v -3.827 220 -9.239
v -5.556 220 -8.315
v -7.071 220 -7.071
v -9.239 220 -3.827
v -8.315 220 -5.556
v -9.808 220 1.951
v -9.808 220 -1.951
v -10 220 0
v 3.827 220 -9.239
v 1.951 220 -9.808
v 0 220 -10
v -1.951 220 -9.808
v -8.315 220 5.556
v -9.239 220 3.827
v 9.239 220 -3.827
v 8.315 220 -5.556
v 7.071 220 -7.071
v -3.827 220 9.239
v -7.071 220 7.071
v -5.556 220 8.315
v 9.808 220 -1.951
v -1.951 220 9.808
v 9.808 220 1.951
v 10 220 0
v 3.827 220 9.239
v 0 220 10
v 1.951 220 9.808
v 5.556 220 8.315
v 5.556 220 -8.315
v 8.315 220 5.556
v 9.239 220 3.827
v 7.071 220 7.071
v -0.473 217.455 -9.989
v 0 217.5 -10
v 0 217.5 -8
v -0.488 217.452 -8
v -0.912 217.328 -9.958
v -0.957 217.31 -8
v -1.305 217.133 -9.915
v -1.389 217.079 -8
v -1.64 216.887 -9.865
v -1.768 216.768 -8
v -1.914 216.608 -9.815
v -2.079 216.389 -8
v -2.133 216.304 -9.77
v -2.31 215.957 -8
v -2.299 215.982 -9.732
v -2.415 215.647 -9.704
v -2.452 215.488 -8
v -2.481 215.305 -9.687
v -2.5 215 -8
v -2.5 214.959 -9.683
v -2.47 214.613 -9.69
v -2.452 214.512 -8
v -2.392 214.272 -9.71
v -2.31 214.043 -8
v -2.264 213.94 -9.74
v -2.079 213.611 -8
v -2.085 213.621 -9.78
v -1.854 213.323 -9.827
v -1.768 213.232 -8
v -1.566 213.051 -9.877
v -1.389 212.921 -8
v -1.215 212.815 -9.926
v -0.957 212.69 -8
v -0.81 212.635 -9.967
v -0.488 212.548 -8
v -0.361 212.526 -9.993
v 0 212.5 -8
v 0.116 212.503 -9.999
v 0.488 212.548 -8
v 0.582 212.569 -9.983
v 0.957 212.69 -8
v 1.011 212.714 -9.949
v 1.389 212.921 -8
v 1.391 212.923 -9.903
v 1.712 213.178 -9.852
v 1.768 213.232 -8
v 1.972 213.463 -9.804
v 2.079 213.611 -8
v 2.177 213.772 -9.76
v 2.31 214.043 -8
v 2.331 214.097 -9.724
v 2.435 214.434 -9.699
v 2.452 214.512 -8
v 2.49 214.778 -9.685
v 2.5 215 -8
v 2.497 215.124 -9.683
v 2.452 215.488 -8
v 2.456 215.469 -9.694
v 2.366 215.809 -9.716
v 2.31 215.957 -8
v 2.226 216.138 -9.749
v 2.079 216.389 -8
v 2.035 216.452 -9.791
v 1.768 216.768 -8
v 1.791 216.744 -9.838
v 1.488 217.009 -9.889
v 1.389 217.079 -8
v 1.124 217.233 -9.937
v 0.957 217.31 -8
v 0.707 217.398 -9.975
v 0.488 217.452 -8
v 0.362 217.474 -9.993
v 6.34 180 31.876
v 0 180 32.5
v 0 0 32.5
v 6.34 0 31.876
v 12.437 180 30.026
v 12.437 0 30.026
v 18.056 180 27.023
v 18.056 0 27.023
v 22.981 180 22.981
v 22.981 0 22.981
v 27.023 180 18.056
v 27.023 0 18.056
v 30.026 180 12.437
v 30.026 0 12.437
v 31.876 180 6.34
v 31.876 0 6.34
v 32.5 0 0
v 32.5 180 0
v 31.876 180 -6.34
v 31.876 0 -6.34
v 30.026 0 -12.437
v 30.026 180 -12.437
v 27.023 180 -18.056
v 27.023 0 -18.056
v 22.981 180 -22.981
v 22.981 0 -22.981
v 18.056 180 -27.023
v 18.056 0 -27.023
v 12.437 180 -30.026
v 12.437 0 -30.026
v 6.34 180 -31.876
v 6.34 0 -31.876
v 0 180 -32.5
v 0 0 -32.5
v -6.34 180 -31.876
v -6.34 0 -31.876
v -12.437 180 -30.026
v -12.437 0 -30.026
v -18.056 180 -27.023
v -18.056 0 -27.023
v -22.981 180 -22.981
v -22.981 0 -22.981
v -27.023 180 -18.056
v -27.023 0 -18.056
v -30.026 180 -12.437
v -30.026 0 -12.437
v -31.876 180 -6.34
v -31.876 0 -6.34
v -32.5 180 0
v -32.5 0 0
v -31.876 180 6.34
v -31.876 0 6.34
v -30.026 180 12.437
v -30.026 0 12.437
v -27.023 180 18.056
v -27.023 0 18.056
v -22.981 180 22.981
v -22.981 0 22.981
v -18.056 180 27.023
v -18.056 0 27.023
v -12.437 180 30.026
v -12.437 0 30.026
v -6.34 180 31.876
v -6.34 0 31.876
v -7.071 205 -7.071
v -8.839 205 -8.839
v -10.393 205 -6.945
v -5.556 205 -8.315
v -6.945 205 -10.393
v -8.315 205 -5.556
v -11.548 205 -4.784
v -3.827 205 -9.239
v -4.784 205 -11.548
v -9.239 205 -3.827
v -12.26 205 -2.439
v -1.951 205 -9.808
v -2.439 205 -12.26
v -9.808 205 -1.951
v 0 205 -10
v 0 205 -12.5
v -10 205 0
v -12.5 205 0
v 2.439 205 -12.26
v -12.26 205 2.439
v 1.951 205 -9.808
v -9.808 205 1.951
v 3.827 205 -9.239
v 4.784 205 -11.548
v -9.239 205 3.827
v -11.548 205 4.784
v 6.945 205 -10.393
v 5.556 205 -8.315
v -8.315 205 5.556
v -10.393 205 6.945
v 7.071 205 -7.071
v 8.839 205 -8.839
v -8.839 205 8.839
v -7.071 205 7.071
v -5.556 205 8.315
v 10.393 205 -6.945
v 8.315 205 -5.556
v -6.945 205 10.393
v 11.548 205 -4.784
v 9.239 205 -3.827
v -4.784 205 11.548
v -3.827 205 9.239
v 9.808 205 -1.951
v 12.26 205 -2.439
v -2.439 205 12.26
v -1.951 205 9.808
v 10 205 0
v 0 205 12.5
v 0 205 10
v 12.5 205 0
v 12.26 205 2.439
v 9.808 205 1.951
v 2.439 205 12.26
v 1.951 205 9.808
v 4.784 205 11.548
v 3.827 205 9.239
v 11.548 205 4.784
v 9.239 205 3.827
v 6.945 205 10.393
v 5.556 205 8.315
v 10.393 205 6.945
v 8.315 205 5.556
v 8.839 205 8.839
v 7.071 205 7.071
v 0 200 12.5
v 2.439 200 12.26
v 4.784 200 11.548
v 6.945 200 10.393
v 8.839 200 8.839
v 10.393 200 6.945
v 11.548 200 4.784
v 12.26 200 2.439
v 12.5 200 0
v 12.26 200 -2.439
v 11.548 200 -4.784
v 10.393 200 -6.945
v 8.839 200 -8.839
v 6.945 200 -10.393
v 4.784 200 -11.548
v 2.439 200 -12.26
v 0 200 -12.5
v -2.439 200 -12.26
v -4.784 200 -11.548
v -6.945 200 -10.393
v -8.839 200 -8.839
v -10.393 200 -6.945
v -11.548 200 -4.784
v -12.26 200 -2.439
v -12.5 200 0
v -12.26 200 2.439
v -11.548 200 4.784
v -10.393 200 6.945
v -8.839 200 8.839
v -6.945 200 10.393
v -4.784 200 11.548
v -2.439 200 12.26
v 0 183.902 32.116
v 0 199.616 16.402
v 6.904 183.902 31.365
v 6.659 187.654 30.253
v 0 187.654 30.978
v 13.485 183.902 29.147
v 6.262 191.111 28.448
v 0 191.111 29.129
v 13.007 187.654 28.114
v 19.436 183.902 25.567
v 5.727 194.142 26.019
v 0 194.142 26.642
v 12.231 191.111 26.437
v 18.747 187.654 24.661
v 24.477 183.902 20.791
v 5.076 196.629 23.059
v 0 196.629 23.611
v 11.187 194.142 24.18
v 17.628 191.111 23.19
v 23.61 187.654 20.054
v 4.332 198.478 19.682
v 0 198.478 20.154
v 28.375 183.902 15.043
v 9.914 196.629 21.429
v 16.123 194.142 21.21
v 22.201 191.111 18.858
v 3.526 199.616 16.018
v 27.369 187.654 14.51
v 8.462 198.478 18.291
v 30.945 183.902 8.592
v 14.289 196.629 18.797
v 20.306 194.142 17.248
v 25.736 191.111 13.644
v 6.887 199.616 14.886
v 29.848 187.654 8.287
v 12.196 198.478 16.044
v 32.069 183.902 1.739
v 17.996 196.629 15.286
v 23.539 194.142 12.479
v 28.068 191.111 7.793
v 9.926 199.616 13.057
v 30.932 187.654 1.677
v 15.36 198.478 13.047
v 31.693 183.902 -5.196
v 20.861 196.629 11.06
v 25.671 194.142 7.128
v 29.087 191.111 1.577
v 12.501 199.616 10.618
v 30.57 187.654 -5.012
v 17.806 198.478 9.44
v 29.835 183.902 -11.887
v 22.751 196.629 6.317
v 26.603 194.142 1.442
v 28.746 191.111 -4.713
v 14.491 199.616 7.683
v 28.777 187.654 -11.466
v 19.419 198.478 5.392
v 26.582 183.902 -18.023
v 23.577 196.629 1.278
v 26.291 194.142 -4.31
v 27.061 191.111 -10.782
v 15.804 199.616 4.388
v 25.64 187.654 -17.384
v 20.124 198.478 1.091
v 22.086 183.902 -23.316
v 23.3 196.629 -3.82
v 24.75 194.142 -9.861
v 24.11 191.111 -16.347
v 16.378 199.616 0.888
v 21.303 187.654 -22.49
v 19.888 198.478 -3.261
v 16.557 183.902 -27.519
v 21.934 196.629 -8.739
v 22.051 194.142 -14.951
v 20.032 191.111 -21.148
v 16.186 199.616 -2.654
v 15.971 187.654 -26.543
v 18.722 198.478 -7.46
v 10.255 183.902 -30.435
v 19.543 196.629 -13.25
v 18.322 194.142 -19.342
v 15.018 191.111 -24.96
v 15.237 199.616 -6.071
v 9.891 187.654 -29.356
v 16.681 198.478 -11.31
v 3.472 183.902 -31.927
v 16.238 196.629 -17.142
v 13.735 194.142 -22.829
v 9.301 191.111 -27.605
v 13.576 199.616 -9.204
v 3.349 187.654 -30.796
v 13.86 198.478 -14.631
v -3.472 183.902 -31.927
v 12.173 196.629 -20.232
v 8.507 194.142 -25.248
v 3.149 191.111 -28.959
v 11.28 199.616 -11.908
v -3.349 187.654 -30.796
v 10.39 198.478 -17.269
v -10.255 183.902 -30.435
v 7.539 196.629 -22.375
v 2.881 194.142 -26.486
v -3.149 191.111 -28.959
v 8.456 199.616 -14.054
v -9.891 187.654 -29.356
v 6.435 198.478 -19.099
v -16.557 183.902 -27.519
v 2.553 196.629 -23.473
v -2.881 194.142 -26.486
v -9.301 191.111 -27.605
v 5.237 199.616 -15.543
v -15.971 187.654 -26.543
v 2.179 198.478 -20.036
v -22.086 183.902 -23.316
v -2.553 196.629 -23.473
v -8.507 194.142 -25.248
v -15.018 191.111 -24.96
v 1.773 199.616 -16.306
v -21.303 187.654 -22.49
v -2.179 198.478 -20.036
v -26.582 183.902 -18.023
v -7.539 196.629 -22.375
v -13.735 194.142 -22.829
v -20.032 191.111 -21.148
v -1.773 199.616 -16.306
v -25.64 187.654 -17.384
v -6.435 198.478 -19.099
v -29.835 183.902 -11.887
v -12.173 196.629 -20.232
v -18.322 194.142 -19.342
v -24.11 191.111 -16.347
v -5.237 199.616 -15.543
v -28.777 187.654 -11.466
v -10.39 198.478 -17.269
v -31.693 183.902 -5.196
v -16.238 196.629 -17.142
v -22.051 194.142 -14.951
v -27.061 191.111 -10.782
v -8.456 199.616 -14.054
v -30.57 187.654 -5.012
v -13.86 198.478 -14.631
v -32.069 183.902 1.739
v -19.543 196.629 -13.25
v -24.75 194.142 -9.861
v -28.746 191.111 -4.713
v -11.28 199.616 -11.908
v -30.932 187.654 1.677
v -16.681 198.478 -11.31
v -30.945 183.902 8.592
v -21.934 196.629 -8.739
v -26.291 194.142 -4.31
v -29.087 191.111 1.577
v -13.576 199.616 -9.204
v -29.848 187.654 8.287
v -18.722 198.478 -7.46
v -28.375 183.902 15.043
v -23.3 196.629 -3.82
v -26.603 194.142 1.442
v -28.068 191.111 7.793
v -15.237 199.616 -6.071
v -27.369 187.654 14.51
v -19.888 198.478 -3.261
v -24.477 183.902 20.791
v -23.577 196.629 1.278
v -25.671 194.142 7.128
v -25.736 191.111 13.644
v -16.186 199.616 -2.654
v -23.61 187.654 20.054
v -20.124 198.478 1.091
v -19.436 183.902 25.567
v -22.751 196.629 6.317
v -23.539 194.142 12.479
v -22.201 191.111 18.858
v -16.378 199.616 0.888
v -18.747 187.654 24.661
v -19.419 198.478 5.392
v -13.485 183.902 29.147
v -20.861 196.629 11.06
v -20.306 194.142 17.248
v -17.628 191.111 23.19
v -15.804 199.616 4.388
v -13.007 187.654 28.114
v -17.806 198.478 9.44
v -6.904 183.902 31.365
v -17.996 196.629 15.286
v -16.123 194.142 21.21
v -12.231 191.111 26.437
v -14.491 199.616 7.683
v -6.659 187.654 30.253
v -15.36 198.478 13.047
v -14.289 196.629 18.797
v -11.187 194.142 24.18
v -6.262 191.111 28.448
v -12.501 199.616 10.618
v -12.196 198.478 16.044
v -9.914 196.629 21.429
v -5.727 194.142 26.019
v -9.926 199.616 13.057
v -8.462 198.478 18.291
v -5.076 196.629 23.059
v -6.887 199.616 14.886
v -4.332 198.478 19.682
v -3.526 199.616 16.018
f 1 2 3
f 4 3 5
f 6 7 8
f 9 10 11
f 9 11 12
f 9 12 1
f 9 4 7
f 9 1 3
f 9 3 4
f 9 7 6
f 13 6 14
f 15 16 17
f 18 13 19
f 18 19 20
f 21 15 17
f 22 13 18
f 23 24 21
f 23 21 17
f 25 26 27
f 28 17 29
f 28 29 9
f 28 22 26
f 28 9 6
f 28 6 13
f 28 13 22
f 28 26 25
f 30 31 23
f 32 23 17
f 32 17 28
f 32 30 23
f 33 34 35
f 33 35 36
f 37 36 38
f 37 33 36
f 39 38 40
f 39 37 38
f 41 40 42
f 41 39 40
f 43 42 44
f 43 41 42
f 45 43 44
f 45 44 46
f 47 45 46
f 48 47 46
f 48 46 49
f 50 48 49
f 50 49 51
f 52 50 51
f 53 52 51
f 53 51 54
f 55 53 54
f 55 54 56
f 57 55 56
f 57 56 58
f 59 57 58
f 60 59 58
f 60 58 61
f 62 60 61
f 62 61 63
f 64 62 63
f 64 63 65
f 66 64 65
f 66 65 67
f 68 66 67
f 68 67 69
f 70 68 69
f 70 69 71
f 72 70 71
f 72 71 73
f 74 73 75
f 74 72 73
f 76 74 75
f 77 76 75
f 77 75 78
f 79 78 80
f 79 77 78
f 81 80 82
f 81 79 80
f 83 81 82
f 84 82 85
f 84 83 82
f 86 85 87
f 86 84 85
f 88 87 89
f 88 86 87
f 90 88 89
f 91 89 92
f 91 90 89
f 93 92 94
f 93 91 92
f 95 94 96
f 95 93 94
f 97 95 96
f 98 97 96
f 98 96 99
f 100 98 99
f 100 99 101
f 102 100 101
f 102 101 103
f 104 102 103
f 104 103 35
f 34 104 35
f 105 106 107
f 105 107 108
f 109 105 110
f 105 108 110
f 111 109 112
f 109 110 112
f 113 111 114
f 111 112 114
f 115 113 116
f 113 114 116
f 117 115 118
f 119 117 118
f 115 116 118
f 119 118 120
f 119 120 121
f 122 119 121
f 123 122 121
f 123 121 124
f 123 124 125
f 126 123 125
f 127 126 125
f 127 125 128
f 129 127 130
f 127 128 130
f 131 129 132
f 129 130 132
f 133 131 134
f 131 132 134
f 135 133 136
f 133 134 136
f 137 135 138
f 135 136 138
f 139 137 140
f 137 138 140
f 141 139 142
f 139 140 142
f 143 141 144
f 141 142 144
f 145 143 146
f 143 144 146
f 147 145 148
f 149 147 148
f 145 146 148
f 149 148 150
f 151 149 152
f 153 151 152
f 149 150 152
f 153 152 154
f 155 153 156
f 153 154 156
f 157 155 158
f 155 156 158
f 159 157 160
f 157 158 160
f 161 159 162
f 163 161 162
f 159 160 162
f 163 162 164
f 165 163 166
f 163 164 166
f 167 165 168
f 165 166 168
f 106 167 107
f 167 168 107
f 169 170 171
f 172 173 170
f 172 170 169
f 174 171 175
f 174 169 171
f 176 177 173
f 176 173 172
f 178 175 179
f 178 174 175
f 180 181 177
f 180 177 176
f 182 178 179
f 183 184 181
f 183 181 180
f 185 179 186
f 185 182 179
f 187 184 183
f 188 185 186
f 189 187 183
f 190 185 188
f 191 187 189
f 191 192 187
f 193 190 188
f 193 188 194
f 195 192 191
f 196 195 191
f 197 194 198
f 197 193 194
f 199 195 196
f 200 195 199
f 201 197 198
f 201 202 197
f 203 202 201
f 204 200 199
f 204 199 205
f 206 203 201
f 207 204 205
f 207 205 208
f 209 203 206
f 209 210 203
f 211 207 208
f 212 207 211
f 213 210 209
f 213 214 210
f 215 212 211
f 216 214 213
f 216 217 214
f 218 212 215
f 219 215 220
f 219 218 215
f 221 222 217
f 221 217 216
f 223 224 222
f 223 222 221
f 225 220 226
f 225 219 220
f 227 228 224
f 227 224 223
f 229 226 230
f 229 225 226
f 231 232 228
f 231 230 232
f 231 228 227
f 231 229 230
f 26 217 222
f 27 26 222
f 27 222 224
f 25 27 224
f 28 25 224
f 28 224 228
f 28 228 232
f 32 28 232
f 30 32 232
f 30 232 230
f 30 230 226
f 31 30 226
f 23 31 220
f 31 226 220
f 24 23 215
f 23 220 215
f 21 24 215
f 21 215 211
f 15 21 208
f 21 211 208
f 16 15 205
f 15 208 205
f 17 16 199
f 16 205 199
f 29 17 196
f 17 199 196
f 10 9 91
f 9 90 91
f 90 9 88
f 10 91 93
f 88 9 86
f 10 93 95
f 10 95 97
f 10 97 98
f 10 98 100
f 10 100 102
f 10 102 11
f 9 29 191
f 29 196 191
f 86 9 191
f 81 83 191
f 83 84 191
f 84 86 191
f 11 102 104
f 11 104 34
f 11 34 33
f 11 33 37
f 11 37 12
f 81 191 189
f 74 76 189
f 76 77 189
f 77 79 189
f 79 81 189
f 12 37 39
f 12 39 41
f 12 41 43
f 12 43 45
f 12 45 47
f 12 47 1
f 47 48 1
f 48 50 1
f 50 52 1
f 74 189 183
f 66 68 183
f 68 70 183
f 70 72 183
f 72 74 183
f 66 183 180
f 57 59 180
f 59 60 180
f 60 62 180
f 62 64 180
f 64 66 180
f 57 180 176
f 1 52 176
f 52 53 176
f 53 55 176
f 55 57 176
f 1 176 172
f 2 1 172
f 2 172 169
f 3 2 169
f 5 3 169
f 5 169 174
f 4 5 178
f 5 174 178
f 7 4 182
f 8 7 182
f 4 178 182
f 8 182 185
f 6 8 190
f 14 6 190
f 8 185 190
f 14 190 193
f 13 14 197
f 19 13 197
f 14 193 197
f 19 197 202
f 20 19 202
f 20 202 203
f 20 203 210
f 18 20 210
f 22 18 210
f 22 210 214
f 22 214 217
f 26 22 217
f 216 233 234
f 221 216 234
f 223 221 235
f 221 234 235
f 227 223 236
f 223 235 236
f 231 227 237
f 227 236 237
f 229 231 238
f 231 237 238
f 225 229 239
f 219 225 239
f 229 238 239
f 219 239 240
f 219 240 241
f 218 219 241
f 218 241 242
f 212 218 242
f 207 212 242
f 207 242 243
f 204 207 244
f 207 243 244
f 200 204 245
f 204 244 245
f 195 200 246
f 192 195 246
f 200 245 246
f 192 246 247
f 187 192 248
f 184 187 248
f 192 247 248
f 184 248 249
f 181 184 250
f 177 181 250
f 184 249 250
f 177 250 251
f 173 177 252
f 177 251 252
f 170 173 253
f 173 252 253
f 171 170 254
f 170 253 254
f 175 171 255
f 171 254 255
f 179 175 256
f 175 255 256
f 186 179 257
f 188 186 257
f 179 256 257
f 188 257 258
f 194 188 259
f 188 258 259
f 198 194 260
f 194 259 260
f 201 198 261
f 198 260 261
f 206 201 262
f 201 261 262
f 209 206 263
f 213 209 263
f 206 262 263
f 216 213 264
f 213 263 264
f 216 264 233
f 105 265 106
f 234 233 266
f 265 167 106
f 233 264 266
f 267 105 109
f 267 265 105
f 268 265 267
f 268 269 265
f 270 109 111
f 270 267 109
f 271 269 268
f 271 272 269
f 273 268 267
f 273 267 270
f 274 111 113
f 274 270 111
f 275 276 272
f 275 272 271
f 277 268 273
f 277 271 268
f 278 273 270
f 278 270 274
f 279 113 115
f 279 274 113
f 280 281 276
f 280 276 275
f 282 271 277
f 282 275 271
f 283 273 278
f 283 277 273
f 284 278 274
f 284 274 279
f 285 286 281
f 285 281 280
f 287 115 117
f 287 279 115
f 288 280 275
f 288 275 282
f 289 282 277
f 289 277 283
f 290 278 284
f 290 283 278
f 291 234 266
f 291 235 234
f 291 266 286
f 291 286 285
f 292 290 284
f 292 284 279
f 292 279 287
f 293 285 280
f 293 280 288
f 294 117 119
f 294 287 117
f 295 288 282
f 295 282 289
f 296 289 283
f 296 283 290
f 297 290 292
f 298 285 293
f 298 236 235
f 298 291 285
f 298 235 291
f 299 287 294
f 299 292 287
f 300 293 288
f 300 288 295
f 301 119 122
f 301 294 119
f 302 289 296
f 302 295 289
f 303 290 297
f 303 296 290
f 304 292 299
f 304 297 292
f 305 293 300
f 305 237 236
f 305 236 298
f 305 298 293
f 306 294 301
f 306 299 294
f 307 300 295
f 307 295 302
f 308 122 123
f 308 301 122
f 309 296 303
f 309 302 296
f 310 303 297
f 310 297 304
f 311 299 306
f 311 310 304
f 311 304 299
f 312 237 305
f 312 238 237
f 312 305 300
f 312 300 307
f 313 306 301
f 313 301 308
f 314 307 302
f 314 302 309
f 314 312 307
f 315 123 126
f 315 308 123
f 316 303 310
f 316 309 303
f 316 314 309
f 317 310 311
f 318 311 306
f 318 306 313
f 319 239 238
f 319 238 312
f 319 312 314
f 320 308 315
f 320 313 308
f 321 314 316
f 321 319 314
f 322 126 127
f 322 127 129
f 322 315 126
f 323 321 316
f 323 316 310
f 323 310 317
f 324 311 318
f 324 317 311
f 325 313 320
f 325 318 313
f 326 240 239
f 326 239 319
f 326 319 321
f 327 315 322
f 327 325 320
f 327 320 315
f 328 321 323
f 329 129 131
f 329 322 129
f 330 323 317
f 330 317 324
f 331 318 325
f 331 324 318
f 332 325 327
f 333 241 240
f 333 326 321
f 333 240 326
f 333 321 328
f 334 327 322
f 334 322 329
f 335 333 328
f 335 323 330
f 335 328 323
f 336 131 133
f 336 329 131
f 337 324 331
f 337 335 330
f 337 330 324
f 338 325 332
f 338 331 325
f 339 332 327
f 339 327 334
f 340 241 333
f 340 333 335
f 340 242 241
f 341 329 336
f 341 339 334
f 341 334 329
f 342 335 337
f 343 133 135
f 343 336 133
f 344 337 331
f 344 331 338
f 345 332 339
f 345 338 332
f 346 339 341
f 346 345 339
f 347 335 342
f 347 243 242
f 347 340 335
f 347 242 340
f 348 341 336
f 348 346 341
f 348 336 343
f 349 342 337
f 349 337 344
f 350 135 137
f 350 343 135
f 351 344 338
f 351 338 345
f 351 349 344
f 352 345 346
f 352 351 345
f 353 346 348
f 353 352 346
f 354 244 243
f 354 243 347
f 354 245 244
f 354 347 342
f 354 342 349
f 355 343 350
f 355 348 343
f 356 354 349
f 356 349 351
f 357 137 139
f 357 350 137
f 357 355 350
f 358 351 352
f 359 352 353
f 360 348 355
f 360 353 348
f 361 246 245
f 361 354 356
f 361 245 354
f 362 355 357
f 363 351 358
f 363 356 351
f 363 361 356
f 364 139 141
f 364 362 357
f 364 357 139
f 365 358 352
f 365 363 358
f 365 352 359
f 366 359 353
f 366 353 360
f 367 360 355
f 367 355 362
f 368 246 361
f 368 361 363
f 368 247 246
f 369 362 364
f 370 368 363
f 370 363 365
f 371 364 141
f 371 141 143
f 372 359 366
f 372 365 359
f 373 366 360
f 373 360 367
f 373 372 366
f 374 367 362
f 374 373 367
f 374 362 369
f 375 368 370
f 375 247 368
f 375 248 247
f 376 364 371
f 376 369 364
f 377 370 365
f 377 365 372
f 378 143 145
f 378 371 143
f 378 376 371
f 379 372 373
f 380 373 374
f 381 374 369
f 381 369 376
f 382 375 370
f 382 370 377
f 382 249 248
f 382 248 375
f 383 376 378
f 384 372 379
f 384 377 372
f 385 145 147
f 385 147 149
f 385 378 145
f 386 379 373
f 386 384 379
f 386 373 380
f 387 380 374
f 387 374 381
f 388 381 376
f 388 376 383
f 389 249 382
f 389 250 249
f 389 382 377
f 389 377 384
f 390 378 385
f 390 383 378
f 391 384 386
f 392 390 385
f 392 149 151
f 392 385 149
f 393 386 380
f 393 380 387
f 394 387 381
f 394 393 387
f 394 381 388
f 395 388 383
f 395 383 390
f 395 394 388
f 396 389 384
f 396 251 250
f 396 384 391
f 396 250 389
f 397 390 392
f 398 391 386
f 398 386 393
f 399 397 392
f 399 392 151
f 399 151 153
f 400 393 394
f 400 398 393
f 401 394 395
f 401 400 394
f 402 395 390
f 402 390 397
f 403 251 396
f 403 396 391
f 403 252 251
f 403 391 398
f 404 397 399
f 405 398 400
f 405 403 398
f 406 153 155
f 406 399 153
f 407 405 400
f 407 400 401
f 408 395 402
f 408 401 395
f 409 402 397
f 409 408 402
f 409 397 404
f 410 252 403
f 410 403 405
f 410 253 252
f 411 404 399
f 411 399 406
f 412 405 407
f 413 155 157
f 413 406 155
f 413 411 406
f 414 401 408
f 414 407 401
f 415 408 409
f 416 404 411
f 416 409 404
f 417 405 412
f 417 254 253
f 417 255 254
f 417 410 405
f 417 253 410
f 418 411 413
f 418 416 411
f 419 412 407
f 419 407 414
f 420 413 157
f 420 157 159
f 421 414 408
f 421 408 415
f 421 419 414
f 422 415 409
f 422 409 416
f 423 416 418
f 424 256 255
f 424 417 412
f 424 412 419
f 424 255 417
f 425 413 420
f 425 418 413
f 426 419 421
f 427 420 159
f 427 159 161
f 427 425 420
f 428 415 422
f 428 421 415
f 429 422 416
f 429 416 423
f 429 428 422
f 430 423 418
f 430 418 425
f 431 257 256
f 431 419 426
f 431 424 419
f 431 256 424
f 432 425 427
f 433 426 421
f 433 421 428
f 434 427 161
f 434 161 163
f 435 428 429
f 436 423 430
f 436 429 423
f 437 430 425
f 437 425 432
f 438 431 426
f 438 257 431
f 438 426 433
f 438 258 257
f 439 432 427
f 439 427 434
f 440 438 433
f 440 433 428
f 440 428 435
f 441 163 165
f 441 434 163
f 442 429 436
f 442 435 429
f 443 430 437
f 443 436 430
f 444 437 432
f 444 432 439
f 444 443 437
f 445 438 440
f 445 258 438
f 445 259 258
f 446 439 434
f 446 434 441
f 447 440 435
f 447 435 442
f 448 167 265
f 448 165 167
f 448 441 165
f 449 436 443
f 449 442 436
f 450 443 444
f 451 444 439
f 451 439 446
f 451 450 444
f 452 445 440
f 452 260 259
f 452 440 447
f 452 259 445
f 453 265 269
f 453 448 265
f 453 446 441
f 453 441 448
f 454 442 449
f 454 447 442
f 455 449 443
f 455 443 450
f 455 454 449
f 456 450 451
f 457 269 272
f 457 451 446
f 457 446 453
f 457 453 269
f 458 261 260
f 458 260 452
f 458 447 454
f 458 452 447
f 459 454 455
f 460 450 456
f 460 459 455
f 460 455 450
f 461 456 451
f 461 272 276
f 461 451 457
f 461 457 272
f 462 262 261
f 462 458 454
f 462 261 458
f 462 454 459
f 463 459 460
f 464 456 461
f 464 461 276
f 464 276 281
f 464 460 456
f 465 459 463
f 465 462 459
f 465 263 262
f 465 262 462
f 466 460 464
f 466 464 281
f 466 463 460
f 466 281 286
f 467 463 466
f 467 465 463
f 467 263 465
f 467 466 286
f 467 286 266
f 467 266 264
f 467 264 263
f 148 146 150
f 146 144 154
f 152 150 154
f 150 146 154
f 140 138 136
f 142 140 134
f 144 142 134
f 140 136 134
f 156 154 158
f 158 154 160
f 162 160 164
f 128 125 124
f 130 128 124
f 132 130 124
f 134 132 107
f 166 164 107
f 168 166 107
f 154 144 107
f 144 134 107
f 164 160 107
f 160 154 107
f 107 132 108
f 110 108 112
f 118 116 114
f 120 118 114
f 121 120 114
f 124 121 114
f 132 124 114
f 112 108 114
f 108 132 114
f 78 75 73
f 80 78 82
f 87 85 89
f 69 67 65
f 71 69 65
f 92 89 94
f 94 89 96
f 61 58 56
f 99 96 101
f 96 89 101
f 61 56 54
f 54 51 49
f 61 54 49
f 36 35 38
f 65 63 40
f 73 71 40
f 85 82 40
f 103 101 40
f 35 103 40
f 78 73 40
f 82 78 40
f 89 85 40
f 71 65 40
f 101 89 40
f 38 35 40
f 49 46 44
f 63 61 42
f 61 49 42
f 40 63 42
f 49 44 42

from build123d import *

# Parameters (mm, degrees)
SKETCH_1_R          = 32.5
EXTRUDE_1_DEPTH     = 200
FILLET_1_R          = 20
SKETCH_2_R          = 10
EXTRUDE_2_DEPTH     = 20
CUT_EXTRUDE_START   = -10
SKETCH_3_R          = 2.5
CUT_EXTRUDE_1_DEPTH = 2
SKETCH_2_3_R        = 12.5
SKETCH_2_3_R_2      = 10
EXTRUDE_3_DEPTH     = 5


with BuildPart() as part:
    # 스케치1 → 보스-돌출1 (new body)
    with BuildSketch(Plane(origin=(0, 0, 0), x_dir=(1, 0, 0), z_dir=(0, 1, 0))):
        Circle(SKETCH_1_R)
    extrude(amount=EXTRUDE_1_DEPTH)

    # 필렛1
    fillet_1_edges = [part.edges().sort_by_distance(p)[0] for p in [
        (-32.5, 200, 0),
    ]]
    fillet(fillet_1_edges, radius=FILLET_1_R)

    # 스케치2 → 보스-돌출2 (add)
    with BuildSketch(Plane(origin=(0, 200, 0), x_dir=(1, 0, 0), z_dir=(0, 1, 0))):
        Circle(SKETCH_2_R)
    extrude(amount=EXTRUDE_2_DEPTH)

    # 스케치3 → 컷-돌출1 (cut)
    with BuildSketch(Plane.XY.offset(CUT_EXTRUDE_START)):
        with Locations((0, 215)):
            Circle(SKETCH_3_R)
    extrude(amount=CUT_EXTRUDE_1_DEPTH, mode=Mode.SUBTRACT)

    # 스케치2<3> → 보스-돌출3 (add)
    with BuildSketch(Plane(origin=(0, 200, 0), x_dir=(1, 0, 0), z_dir=(0, 1, 0))):
        Circle(SKETCH_2_3_R)
        Circle(SKETCH_2_3_R_2, mode=Mode.SUBTRACT)
    extrude(amount=EXTRUDE_3_DEPTH)


solid = part.part
